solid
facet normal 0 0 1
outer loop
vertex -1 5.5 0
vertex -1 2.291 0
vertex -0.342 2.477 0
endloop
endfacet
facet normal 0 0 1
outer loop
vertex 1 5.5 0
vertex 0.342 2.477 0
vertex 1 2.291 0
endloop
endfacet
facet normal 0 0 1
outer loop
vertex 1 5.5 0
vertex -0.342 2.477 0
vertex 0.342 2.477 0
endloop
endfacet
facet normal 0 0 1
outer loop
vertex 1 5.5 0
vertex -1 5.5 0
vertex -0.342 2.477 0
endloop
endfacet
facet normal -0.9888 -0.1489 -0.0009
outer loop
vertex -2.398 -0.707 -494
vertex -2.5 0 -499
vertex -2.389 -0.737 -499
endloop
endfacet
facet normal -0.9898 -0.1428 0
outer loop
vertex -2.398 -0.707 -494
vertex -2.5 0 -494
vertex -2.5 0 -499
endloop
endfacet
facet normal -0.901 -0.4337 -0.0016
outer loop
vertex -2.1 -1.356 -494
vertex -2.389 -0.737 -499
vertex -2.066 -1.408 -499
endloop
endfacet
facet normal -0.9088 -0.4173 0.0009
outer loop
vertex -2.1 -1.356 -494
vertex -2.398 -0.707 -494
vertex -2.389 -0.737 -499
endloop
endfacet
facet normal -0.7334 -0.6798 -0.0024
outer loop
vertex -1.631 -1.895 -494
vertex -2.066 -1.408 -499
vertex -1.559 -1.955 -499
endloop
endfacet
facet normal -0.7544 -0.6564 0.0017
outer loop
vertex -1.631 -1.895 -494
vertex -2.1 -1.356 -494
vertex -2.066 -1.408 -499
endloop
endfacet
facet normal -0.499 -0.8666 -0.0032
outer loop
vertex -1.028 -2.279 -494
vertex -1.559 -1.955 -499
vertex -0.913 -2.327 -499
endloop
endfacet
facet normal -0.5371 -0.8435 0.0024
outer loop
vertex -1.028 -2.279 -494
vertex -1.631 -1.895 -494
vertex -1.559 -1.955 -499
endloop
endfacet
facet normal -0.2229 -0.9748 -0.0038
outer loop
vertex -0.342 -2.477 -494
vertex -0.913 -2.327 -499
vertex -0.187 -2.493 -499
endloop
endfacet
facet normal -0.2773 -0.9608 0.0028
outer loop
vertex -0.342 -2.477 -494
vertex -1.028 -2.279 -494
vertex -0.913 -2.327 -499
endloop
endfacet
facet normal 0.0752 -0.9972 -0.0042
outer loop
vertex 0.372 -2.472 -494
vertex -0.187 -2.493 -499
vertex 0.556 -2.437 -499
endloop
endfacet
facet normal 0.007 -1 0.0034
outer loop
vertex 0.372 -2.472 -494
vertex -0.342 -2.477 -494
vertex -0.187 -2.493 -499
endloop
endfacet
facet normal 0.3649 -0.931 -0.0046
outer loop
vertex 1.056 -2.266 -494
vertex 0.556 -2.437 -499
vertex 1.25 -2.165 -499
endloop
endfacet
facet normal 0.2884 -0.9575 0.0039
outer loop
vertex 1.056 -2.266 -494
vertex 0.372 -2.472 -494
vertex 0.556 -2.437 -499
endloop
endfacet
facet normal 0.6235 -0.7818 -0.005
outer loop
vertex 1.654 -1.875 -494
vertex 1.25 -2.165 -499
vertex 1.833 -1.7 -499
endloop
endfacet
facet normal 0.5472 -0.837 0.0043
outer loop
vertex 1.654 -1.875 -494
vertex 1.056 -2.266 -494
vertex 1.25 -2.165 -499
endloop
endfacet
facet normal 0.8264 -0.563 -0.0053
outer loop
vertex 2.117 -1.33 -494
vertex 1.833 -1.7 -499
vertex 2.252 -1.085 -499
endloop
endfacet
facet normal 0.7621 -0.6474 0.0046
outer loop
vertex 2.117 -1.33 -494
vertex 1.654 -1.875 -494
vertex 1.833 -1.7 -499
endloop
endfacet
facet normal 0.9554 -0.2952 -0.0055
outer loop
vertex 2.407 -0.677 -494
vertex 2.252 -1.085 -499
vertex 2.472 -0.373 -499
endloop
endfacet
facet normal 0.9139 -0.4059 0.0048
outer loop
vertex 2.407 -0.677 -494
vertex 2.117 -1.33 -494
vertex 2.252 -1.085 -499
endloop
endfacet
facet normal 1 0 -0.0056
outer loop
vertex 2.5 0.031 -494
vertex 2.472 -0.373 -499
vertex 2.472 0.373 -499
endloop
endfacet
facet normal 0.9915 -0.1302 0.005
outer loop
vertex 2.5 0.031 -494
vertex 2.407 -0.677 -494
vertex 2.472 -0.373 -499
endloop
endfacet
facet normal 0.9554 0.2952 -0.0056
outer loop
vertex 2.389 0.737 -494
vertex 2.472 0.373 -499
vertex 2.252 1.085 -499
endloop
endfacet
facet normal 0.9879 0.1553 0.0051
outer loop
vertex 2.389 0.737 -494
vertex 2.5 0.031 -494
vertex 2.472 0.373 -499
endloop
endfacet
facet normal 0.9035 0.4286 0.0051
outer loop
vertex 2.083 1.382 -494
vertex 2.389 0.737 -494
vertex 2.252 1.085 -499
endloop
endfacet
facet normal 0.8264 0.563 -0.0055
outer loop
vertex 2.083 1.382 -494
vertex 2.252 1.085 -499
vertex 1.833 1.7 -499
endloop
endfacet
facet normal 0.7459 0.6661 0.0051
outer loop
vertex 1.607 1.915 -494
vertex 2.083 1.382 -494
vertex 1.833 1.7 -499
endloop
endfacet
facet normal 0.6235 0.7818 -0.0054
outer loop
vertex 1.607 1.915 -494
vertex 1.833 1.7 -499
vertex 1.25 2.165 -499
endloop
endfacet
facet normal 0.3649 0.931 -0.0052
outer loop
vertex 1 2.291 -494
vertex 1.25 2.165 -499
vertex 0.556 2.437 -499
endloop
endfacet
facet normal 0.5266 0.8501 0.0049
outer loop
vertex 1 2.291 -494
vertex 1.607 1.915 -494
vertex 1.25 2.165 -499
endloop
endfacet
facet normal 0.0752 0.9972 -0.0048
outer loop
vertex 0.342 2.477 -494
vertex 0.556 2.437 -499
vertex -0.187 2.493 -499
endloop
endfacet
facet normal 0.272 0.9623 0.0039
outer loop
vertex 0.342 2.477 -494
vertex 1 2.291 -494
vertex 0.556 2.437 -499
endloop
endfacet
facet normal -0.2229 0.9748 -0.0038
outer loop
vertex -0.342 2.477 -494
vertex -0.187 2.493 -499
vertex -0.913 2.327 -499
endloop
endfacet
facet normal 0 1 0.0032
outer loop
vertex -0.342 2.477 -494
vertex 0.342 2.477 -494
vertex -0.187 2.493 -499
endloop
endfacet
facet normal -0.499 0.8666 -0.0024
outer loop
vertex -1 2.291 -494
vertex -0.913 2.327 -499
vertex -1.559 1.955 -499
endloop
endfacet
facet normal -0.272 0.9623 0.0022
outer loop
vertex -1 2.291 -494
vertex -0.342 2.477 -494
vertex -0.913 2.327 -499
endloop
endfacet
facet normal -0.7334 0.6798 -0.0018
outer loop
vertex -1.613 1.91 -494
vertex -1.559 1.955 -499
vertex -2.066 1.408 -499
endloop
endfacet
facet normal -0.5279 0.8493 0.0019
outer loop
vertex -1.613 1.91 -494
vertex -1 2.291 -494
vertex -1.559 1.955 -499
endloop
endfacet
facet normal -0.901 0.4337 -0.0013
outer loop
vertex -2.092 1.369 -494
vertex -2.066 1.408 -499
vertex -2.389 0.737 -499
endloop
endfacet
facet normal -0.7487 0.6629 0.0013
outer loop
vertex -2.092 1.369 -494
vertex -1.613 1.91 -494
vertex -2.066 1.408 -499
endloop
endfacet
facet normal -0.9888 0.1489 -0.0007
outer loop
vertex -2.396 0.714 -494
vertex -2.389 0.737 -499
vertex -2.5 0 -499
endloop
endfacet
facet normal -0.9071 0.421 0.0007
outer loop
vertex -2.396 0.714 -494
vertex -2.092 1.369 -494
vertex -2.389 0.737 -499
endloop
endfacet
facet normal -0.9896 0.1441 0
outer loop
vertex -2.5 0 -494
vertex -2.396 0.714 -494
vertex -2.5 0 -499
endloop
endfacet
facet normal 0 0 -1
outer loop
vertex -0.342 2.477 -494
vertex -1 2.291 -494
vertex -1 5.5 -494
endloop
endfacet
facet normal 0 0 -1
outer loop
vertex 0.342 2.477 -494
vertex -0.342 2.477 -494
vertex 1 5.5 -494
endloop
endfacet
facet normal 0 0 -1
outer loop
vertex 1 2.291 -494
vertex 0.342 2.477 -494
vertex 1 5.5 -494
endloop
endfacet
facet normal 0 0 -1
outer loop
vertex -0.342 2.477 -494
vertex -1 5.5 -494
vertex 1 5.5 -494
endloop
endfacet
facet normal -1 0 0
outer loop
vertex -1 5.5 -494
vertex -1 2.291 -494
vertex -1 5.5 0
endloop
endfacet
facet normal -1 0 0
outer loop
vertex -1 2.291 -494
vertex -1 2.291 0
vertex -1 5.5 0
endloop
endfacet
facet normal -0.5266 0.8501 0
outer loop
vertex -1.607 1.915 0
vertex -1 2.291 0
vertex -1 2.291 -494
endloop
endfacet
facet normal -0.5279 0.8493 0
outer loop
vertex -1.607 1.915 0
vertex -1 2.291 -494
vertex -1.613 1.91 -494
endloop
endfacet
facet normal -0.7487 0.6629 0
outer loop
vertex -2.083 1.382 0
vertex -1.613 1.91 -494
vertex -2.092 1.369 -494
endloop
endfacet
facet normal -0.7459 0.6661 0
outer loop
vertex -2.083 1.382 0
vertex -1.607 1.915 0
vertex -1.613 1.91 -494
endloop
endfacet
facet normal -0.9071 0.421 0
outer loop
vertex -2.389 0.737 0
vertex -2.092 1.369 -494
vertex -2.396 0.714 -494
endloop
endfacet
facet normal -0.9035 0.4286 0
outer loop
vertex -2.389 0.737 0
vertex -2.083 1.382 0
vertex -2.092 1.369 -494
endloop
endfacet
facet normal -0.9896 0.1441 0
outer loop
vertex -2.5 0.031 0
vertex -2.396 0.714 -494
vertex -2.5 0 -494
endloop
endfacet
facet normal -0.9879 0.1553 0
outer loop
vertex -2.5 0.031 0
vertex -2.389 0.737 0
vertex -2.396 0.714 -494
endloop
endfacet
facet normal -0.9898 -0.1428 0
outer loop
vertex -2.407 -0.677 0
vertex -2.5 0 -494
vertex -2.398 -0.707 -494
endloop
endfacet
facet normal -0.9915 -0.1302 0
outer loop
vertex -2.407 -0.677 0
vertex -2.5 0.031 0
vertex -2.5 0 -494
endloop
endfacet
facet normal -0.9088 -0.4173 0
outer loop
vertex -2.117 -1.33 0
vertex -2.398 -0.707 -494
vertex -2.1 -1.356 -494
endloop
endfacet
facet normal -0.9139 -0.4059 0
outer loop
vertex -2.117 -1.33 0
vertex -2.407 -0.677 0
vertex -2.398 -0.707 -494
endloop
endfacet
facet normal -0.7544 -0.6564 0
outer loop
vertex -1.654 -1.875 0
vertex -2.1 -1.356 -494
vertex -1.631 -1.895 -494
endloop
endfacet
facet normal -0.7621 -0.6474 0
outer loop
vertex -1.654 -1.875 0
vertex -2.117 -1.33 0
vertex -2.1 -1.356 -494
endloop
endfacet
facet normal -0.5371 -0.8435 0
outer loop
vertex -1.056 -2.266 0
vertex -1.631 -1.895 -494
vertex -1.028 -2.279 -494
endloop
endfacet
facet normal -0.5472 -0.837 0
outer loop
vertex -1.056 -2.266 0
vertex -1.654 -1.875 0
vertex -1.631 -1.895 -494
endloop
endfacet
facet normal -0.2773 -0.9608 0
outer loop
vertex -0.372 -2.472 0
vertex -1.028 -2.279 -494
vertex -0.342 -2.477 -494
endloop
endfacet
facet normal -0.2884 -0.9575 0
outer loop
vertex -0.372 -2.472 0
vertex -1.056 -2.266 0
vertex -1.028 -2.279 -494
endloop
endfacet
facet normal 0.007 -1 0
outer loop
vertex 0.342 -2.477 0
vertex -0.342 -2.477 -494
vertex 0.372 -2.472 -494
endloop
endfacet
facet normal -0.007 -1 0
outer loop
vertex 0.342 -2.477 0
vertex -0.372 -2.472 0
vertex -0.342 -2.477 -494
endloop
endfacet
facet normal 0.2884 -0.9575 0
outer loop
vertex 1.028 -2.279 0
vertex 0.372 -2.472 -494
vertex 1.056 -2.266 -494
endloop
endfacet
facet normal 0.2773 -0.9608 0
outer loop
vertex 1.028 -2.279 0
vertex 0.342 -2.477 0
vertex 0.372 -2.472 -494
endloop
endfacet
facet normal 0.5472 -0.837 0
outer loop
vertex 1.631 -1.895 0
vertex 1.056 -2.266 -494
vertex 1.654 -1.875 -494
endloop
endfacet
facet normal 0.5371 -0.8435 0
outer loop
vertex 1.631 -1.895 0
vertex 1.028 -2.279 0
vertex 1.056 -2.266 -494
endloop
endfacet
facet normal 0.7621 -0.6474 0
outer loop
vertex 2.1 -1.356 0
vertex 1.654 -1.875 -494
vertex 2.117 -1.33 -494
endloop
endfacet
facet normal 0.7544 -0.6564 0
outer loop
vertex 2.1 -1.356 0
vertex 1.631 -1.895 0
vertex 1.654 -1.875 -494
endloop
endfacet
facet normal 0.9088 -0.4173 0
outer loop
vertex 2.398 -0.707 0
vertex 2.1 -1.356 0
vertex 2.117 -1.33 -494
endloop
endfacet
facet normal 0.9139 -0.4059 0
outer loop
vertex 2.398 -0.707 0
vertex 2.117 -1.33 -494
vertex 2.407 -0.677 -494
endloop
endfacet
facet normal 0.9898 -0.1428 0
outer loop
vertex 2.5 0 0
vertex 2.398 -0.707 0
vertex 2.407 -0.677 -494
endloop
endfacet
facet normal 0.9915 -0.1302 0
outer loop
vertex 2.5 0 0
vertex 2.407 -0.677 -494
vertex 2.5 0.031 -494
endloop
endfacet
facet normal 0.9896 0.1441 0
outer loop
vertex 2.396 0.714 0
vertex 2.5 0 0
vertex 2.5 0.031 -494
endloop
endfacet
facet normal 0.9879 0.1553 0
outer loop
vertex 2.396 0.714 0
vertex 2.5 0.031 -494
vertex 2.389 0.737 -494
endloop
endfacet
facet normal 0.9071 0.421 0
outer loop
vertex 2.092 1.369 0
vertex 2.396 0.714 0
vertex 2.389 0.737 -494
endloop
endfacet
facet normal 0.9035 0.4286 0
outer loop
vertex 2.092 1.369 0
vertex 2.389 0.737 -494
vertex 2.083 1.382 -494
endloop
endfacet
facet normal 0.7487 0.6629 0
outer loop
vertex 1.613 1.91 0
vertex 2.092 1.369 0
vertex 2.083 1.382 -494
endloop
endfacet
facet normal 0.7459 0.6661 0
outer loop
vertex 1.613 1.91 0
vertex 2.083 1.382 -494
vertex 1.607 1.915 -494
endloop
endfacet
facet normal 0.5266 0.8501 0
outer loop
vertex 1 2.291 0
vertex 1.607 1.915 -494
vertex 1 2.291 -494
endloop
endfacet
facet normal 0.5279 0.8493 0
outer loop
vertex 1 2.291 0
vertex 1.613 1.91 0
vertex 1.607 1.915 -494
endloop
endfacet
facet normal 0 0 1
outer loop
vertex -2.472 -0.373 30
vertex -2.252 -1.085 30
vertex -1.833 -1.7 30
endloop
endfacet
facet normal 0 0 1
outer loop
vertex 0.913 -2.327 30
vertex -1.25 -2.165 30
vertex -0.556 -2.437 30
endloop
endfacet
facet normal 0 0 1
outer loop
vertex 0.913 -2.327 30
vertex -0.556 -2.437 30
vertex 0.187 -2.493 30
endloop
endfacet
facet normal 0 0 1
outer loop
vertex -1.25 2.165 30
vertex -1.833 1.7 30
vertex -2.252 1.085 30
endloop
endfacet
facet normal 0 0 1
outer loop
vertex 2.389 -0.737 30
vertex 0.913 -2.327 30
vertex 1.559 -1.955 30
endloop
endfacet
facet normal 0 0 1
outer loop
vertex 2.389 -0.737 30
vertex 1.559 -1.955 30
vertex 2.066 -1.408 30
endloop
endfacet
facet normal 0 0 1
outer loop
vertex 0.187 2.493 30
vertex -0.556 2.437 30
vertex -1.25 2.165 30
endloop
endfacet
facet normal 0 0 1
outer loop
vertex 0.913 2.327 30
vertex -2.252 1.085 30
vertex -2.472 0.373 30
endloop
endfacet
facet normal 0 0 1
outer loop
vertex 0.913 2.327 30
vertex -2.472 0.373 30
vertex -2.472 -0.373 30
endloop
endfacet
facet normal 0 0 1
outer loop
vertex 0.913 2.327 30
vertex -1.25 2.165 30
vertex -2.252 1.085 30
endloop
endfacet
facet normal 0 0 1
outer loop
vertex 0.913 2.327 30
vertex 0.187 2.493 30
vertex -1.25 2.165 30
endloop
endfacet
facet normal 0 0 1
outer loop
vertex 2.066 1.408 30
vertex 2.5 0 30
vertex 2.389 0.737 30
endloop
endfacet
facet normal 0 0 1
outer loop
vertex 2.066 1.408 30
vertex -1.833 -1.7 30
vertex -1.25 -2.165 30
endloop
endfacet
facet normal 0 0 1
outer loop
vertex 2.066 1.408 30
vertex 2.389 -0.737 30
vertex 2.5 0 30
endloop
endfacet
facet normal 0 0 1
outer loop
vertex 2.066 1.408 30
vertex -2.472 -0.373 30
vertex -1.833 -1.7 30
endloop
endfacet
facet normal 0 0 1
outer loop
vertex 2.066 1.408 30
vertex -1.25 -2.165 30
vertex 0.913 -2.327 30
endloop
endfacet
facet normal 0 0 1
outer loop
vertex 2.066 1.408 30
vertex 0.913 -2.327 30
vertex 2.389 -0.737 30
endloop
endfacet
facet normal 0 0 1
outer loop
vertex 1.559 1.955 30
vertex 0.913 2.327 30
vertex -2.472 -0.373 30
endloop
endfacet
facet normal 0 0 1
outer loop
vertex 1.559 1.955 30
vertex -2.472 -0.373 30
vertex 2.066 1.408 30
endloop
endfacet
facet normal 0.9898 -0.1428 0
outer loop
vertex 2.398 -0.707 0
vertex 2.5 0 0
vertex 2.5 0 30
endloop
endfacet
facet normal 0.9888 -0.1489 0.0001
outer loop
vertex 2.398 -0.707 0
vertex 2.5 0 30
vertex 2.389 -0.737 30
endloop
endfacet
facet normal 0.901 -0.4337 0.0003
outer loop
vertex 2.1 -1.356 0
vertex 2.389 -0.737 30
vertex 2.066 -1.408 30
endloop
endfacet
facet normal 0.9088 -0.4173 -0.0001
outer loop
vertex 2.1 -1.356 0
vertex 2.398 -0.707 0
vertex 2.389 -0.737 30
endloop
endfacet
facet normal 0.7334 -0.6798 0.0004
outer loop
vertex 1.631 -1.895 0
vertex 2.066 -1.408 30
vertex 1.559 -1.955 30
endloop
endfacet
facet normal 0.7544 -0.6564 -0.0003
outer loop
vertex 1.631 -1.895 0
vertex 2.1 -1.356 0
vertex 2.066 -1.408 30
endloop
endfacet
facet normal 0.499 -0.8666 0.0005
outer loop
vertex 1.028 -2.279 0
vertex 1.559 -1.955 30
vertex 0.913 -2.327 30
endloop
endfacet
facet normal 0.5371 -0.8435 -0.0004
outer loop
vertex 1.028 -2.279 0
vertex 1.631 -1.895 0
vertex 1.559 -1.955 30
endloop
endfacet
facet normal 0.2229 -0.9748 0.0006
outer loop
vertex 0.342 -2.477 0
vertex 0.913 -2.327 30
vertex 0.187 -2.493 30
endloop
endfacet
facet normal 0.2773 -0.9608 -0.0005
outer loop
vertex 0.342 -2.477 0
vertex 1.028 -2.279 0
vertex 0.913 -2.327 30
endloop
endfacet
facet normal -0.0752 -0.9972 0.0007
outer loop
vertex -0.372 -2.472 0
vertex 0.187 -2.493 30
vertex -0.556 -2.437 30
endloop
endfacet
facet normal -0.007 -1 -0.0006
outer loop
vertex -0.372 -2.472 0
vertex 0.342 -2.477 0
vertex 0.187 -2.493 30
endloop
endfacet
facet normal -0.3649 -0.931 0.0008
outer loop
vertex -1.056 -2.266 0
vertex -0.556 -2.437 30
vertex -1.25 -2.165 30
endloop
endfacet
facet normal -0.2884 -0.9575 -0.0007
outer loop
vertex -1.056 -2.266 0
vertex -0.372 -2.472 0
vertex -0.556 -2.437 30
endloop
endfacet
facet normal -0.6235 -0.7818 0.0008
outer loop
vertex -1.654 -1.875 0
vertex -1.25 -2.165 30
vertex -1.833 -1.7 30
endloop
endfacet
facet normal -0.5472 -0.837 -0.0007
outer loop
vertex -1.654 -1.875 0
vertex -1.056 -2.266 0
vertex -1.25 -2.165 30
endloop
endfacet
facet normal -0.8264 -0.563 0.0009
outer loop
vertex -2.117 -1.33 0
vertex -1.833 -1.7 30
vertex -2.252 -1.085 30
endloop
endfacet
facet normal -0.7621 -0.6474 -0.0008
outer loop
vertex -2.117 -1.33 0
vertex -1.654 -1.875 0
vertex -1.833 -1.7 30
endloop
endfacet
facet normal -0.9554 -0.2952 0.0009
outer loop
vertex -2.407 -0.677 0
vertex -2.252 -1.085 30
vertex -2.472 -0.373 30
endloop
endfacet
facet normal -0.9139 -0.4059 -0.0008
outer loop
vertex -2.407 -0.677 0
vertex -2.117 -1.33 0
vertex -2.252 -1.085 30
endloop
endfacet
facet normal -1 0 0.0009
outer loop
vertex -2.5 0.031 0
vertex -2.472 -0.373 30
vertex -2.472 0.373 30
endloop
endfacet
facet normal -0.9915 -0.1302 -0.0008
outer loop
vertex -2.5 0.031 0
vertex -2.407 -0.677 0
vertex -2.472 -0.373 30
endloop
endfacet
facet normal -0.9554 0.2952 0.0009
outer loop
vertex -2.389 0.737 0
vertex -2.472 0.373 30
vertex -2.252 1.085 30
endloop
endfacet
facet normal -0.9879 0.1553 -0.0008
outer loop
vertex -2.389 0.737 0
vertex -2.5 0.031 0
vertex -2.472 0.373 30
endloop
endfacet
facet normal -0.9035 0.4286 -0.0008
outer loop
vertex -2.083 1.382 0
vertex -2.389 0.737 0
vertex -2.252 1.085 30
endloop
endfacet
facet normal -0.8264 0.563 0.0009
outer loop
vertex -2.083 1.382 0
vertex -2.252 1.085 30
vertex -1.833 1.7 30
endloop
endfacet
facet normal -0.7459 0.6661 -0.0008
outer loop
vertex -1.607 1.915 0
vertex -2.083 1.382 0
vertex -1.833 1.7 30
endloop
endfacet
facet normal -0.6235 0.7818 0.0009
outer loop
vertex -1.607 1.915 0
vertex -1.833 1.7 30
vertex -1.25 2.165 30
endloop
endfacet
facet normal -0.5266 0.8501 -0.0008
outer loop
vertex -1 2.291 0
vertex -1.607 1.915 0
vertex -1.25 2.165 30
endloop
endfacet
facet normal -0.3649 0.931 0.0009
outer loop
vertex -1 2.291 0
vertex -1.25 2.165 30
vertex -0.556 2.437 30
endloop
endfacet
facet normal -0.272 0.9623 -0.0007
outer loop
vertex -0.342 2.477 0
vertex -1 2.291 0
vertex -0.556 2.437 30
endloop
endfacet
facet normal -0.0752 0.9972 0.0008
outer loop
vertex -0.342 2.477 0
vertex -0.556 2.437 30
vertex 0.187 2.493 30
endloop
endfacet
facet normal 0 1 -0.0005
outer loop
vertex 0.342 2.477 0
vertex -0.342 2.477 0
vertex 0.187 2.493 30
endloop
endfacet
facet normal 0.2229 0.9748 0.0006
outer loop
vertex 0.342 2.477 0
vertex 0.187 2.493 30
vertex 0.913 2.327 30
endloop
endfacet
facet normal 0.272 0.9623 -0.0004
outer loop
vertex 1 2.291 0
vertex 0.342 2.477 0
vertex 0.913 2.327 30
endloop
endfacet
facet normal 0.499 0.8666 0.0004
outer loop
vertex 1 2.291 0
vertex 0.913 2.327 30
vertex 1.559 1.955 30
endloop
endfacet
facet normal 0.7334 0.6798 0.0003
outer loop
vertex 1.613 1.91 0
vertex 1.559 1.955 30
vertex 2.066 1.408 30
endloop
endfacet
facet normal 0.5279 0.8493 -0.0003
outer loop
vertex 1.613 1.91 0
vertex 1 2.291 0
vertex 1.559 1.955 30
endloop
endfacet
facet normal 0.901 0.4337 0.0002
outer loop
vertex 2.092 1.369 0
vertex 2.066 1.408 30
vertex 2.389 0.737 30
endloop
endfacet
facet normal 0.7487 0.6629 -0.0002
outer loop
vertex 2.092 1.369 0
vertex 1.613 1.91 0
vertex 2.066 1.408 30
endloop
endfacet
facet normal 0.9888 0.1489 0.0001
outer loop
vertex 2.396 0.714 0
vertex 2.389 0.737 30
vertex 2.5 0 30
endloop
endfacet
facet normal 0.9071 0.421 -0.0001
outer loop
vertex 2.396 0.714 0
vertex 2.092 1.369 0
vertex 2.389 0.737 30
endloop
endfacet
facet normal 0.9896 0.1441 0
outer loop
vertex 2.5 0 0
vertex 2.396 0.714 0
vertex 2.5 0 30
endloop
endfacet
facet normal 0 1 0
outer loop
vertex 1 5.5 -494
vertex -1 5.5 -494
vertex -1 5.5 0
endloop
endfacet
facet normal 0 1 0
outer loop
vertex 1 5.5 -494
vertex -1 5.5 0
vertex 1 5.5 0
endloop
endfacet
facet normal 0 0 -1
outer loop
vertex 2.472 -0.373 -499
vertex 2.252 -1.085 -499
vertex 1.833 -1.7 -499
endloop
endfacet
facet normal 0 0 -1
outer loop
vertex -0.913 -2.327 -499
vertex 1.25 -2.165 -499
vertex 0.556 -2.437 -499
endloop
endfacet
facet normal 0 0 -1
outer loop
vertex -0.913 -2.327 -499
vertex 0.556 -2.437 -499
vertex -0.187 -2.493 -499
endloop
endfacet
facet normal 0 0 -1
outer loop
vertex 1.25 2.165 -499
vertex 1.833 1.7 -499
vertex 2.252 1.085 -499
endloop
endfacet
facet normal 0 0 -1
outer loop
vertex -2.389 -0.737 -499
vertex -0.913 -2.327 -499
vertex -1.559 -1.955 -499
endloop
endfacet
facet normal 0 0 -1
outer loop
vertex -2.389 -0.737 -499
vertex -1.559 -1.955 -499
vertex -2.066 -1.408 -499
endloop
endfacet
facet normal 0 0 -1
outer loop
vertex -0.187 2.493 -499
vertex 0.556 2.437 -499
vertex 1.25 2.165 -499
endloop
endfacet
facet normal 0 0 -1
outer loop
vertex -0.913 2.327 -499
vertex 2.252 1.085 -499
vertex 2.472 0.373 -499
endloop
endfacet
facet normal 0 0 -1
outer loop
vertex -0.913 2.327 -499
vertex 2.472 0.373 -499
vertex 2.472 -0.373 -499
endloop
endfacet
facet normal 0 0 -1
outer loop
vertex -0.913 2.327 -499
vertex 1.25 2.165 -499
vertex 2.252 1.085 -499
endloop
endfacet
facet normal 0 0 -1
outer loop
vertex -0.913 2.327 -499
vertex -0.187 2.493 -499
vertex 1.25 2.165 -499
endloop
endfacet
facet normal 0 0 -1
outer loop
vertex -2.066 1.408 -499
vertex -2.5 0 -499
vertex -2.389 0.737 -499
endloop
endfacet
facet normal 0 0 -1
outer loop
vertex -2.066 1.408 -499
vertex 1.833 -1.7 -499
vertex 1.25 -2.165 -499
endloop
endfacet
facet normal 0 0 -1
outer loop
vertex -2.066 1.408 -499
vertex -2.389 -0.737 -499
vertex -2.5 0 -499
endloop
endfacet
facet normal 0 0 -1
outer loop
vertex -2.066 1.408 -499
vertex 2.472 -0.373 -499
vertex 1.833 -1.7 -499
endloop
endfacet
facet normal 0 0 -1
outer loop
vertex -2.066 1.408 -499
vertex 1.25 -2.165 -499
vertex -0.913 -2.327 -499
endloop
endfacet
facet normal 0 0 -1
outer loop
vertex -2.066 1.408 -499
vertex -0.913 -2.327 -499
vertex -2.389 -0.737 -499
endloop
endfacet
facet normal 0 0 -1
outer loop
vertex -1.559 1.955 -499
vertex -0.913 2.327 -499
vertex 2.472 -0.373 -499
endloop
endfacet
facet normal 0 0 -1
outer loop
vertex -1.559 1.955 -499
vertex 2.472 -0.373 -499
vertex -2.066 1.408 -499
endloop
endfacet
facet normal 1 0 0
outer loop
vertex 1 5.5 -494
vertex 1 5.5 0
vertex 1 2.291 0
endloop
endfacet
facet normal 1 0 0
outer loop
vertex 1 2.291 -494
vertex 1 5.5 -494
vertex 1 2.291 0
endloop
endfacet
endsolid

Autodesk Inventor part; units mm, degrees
ref_plane "YZ Plane" through (0, 0, 0) normal (1, 0, 0) x (0, 1, 0)
ref_plane "XZ Plane" through (0, 0, 0) normal (0, 1, 0) x (-1, 0, 0)
ref_plane "XY Plane" through (0, 0, 0) normal (0, 0, 1) x (1, 0, 0)
sketch "Sketch1" plane through (0, 0, 0) normal (0, 0, 1) x (1, 0, 0)
  arc A0 (-1, 2.2913) -> (1, 2.2913) centre (0, 0) ccw
  line L0 (-1, 5.5) -> (1, 5.5)
  line L1 (1, 5.5) -> (1, 2.2913)
  line L2 (-1, 2.2913) -> (-1, 5.5)
  line L3 (-1, 5.5) -> (1, 2.5) construction
  line L4 (1, 5.5) -> (-1, 2.5) construction
  point P0 (0, 4)
  dimension "d0" = 5
extrude "Extrusion1" add sketch "Sketch1" against normal blind 494
sketch "Sketch2" plane through (0, 0, 0) normal (0, 0, 1) x (1, 0, 0)
  circle A0 centre (0, 0) radius 2.5
  dimension "d3" = 5
extrude "Extrusion2" add sketch "Sketch2" along normal blind 30
sketch "Sketch3" plane through (0, 0, -494) normal (0, 0, -1) x (-1, 0, 0)
  circle A0 centre (0, 0) radius 2.5
  dimension "d6" = 5
extrude "Extrusion3" add sketch "Sketch3" along normal blind 5
properties part number "shaft"
